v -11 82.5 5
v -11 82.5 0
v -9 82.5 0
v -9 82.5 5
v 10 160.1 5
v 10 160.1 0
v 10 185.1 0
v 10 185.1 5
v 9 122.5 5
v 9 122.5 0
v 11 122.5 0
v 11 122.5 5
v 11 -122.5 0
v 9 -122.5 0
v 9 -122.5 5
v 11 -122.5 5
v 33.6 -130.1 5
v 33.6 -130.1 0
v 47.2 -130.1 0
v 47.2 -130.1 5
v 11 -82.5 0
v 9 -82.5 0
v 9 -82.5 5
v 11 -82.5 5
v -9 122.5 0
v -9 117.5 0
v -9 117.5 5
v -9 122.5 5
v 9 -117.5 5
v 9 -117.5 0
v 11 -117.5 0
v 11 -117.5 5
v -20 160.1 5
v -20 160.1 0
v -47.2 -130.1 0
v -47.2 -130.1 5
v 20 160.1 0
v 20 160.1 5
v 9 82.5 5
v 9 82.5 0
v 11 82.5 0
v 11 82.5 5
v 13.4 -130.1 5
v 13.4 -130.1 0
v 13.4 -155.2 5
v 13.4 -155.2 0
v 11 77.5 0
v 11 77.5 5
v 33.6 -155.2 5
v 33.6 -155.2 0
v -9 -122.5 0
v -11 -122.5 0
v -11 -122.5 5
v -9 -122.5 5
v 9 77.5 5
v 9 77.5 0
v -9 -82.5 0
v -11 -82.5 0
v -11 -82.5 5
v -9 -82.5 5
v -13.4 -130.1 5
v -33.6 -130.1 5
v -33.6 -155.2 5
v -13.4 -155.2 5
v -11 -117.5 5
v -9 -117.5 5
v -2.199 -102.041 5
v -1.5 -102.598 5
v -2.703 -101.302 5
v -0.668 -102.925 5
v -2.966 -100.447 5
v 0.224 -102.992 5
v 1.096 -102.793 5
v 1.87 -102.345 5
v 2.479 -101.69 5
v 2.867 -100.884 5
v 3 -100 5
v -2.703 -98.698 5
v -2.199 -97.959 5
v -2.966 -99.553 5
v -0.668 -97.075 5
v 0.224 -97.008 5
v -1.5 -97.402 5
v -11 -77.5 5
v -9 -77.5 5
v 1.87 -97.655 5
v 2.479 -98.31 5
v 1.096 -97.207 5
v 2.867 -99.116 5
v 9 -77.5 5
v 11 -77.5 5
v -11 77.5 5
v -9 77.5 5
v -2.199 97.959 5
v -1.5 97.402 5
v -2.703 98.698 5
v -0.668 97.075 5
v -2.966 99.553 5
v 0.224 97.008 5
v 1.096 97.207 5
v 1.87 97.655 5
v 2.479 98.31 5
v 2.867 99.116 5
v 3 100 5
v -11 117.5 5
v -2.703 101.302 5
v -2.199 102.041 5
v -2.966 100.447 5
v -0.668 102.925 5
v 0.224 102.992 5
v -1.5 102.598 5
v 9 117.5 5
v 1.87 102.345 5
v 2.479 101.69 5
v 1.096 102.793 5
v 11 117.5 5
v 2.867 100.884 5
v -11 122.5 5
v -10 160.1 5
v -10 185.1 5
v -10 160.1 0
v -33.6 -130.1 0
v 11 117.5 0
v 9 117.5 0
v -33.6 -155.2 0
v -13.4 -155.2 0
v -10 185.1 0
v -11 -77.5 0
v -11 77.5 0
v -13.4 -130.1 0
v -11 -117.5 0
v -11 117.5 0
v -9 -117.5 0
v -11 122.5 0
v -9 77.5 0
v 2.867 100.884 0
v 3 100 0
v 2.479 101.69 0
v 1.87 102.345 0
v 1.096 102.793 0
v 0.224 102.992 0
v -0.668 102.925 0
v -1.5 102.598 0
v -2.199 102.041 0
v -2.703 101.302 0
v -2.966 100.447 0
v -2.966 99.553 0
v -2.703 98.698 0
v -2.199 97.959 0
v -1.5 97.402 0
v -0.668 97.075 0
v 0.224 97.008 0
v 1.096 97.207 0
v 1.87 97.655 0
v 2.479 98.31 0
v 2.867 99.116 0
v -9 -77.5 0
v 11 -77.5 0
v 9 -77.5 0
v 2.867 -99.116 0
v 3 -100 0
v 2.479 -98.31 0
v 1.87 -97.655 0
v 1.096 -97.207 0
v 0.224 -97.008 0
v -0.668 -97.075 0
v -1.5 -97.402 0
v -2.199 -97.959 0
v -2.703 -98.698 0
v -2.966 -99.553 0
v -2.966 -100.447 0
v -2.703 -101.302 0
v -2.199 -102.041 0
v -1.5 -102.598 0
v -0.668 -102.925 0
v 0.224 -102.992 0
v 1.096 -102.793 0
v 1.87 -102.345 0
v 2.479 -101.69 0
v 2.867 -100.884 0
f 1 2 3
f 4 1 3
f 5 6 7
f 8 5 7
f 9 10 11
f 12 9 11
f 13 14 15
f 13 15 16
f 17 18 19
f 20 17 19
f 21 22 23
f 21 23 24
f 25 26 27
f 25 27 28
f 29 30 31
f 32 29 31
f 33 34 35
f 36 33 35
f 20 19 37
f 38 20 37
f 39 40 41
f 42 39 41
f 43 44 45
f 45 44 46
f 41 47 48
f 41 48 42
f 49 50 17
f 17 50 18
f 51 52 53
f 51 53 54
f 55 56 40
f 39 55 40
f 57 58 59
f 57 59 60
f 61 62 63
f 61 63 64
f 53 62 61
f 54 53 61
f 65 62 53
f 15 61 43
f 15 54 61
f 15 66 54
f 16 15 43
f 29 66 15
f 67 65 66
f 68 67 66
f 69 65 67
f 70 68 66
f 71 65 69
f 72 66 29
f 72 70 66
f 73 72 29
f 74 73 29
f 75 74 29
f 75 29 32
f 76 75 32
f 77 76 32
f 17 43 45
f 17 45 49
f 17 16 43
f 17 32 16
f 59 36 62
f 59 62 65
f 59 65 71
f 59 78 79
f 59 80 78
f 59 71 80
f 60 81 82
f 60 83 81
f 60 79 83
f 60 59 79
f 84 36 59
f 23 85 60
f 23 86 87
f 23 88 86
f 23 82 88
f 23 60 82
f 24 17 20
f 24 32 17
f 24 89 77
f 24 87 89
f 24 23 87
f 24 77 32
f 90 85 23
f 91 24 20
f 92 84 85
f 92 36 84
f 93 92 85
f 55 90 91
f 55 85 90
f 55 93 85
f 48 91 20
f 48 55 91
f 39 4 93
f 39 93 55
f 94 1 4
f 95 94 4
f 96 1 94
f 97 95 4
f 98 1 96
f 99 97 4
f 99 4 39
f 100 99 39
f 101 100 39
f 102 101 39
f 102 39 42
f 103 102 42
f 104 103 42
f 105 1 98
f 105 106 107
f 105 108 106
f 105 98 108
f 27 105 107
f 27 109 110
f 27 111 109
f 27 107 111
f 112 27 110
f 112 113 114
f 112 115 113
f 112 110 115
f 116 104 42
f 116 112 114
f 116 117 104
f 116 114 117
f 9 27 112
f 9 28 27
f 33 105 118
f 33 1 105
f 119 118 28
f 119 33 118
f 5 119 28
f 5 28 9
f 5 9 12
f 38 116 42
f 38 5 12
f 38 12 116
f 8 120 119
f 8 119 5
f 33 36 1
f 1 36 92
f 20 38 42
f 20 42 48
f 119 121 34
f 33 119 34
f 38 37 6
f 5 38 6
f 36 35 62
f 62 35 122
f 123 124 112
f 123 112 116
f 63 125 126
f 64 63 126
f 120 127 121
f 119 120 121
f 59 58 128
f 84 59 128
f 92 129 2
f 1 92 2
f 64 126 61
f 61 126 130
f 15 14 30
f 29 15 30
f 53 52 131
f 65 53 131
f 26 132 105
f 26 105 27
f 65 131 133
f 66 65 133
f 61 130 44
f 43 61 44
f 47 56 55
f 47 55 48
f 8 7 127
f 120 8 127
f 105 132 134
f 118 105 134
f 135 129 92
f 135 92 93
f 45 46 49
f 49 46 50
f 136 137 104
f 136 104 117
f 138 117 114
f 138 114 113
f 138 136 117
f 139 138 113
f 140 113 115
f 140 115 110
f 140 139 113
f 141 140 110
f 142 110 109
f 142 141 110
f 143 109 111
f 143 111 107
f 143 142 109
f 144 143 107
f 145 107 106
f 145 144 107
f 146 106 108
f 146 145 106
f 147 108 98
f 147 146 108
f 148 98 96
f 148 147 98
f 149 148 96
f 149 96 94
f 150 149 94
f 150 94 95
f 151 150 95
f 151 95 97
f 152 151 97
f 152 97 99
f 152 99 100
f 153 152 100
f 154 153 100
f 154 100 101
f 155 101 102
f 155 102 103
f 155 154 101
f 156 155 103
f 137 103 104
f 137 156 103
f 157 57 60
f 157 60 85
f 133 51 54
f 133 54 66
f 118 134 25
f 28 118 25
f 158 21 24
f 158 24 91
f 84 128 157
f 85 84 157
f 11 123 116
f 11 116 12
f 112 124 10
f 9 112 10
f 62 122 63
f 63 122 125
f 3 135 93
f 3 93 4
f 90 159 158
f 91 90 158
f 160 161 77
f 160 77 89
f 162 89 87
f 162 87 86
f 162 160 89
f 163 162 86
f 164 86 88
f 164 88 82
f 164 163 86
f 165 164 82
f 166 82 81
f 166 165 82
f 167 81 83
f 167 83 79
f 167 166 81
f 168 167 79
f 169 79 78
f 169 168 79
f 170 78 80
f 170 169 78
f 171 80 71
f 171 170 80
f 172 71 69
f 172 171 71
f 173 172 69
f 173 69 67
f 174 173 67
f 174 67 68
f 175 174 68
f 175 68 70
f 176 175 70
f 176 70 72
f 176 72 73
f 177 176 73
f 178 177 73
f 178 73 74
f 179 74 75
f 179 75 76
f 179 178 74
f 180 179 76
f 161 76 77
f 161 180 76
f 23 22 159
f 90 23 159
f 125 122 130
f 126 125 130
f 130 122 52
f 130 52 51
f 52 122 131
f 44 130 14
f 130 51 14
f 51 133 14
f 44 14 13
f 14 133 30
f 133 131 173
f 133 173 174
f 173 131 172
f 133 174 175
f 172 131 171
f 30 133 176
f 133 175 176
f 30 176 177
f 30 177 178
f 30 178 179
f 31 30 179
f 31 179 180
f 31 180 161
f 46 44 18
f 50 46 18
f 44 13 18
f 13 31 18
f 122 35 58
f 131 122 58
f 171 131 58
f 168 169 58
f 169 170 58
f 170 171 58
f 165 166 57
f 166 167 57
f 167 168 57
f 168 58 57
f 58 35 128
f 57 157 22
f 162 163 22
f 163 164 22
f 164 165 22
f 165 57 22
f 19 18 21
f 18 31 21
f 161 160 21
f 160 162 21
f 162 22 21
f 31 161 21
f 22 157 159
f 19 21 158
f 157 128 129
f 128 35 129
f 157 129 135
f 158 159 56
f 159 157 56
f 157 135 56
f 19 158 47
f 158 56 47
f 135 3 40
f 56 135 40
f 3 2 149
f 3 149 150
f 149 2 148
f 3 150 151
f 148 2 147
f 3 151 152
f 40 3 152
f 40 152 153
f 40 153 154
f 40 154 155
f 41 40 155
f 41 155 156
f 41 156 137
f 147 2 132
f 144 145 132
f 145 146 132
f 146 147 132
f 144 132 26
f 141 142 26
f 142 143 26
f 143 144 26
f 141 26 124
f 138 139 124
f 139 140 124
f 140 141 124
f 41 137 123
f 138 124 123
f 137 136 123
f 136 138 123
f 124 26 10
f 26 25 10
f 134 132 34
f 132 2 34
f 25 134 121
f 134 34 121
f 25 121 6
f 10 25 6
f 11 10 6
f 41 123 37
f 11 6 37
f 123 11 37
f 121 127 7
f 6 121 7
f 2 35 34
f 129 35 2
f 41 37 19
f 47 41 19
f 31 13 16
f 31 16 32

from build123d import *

# Parameters (mm, degrees)
SKETCH010_R  = 3
SKETCH010_W  = 2
SKETCH010_H  = 5
PAD010_DEPTH = 5


with BuildPart() as part:
    # Sketch010 → Pad010 (new body)
    with BuildSketch(Plane.XY):
        Polygon((-10, 160.1), (-20, 160.1), (-47.2, -130.1), (-33.6, -130.1), (-33.6, -155.2), (-13.4, -155.2), (-13.4, -130.1), (13.4, -130.1), (13.4, -155.2), (33.6, -155.2), (33.6, -130.1), (47.2, -130.1), (20, 160.1), (10, 160.1), (10, 185.1), (-10, 185.1), align=None)
        with Locations((0, -100)):
            Circle(SKETCH010_R, mode=Mode.SUBTRACT)
        with Locations((0, 100)):
            Circle(SKETCH010_R, mode=Mode.SUBTRACT)
        with Locations((-10, -80)):
            Rectangle(SKETCH010_W, SKETCH010_H, mode=Mode.SUBTRACT)
        with Locations((10, -80)):
            Rectangle(SKETCH010_W, SKETCH010_H, mode=Mode.SUBTRACT)
        with Locations((-10, -120)):
            Rectangle(SKETCH010_W, SKETCH010_H, mode=Mode.SUBTRACT)
        with Locations((10, -120)):
            Rectangle(SKETCH010_W, SKETCH010_H, mode=Mode.SUBTRACT)
        with Locations((-10, 120)):
            Rectangle(SKETCH010_W, SKETCH010_H, mode=Mode.SUBTRACT)
        with Locations((10, 120)):
            Rectangle(SKETCH010_W, SKETCH010_H, mode=Mode.SUBTRACT)
        with Locations((-10, 80)):
            Rectangle(SKETCH010_W, SKETCH010_H, mode=Mode.SUBTRACT)
        with Locations((10, 80)):
            Rectangle(SKETCH010_W, SKETCH010_H, mode=Mode.SUBTRACT)
    extrude(amount=PAD010_DEPTH)


solid = part.part
